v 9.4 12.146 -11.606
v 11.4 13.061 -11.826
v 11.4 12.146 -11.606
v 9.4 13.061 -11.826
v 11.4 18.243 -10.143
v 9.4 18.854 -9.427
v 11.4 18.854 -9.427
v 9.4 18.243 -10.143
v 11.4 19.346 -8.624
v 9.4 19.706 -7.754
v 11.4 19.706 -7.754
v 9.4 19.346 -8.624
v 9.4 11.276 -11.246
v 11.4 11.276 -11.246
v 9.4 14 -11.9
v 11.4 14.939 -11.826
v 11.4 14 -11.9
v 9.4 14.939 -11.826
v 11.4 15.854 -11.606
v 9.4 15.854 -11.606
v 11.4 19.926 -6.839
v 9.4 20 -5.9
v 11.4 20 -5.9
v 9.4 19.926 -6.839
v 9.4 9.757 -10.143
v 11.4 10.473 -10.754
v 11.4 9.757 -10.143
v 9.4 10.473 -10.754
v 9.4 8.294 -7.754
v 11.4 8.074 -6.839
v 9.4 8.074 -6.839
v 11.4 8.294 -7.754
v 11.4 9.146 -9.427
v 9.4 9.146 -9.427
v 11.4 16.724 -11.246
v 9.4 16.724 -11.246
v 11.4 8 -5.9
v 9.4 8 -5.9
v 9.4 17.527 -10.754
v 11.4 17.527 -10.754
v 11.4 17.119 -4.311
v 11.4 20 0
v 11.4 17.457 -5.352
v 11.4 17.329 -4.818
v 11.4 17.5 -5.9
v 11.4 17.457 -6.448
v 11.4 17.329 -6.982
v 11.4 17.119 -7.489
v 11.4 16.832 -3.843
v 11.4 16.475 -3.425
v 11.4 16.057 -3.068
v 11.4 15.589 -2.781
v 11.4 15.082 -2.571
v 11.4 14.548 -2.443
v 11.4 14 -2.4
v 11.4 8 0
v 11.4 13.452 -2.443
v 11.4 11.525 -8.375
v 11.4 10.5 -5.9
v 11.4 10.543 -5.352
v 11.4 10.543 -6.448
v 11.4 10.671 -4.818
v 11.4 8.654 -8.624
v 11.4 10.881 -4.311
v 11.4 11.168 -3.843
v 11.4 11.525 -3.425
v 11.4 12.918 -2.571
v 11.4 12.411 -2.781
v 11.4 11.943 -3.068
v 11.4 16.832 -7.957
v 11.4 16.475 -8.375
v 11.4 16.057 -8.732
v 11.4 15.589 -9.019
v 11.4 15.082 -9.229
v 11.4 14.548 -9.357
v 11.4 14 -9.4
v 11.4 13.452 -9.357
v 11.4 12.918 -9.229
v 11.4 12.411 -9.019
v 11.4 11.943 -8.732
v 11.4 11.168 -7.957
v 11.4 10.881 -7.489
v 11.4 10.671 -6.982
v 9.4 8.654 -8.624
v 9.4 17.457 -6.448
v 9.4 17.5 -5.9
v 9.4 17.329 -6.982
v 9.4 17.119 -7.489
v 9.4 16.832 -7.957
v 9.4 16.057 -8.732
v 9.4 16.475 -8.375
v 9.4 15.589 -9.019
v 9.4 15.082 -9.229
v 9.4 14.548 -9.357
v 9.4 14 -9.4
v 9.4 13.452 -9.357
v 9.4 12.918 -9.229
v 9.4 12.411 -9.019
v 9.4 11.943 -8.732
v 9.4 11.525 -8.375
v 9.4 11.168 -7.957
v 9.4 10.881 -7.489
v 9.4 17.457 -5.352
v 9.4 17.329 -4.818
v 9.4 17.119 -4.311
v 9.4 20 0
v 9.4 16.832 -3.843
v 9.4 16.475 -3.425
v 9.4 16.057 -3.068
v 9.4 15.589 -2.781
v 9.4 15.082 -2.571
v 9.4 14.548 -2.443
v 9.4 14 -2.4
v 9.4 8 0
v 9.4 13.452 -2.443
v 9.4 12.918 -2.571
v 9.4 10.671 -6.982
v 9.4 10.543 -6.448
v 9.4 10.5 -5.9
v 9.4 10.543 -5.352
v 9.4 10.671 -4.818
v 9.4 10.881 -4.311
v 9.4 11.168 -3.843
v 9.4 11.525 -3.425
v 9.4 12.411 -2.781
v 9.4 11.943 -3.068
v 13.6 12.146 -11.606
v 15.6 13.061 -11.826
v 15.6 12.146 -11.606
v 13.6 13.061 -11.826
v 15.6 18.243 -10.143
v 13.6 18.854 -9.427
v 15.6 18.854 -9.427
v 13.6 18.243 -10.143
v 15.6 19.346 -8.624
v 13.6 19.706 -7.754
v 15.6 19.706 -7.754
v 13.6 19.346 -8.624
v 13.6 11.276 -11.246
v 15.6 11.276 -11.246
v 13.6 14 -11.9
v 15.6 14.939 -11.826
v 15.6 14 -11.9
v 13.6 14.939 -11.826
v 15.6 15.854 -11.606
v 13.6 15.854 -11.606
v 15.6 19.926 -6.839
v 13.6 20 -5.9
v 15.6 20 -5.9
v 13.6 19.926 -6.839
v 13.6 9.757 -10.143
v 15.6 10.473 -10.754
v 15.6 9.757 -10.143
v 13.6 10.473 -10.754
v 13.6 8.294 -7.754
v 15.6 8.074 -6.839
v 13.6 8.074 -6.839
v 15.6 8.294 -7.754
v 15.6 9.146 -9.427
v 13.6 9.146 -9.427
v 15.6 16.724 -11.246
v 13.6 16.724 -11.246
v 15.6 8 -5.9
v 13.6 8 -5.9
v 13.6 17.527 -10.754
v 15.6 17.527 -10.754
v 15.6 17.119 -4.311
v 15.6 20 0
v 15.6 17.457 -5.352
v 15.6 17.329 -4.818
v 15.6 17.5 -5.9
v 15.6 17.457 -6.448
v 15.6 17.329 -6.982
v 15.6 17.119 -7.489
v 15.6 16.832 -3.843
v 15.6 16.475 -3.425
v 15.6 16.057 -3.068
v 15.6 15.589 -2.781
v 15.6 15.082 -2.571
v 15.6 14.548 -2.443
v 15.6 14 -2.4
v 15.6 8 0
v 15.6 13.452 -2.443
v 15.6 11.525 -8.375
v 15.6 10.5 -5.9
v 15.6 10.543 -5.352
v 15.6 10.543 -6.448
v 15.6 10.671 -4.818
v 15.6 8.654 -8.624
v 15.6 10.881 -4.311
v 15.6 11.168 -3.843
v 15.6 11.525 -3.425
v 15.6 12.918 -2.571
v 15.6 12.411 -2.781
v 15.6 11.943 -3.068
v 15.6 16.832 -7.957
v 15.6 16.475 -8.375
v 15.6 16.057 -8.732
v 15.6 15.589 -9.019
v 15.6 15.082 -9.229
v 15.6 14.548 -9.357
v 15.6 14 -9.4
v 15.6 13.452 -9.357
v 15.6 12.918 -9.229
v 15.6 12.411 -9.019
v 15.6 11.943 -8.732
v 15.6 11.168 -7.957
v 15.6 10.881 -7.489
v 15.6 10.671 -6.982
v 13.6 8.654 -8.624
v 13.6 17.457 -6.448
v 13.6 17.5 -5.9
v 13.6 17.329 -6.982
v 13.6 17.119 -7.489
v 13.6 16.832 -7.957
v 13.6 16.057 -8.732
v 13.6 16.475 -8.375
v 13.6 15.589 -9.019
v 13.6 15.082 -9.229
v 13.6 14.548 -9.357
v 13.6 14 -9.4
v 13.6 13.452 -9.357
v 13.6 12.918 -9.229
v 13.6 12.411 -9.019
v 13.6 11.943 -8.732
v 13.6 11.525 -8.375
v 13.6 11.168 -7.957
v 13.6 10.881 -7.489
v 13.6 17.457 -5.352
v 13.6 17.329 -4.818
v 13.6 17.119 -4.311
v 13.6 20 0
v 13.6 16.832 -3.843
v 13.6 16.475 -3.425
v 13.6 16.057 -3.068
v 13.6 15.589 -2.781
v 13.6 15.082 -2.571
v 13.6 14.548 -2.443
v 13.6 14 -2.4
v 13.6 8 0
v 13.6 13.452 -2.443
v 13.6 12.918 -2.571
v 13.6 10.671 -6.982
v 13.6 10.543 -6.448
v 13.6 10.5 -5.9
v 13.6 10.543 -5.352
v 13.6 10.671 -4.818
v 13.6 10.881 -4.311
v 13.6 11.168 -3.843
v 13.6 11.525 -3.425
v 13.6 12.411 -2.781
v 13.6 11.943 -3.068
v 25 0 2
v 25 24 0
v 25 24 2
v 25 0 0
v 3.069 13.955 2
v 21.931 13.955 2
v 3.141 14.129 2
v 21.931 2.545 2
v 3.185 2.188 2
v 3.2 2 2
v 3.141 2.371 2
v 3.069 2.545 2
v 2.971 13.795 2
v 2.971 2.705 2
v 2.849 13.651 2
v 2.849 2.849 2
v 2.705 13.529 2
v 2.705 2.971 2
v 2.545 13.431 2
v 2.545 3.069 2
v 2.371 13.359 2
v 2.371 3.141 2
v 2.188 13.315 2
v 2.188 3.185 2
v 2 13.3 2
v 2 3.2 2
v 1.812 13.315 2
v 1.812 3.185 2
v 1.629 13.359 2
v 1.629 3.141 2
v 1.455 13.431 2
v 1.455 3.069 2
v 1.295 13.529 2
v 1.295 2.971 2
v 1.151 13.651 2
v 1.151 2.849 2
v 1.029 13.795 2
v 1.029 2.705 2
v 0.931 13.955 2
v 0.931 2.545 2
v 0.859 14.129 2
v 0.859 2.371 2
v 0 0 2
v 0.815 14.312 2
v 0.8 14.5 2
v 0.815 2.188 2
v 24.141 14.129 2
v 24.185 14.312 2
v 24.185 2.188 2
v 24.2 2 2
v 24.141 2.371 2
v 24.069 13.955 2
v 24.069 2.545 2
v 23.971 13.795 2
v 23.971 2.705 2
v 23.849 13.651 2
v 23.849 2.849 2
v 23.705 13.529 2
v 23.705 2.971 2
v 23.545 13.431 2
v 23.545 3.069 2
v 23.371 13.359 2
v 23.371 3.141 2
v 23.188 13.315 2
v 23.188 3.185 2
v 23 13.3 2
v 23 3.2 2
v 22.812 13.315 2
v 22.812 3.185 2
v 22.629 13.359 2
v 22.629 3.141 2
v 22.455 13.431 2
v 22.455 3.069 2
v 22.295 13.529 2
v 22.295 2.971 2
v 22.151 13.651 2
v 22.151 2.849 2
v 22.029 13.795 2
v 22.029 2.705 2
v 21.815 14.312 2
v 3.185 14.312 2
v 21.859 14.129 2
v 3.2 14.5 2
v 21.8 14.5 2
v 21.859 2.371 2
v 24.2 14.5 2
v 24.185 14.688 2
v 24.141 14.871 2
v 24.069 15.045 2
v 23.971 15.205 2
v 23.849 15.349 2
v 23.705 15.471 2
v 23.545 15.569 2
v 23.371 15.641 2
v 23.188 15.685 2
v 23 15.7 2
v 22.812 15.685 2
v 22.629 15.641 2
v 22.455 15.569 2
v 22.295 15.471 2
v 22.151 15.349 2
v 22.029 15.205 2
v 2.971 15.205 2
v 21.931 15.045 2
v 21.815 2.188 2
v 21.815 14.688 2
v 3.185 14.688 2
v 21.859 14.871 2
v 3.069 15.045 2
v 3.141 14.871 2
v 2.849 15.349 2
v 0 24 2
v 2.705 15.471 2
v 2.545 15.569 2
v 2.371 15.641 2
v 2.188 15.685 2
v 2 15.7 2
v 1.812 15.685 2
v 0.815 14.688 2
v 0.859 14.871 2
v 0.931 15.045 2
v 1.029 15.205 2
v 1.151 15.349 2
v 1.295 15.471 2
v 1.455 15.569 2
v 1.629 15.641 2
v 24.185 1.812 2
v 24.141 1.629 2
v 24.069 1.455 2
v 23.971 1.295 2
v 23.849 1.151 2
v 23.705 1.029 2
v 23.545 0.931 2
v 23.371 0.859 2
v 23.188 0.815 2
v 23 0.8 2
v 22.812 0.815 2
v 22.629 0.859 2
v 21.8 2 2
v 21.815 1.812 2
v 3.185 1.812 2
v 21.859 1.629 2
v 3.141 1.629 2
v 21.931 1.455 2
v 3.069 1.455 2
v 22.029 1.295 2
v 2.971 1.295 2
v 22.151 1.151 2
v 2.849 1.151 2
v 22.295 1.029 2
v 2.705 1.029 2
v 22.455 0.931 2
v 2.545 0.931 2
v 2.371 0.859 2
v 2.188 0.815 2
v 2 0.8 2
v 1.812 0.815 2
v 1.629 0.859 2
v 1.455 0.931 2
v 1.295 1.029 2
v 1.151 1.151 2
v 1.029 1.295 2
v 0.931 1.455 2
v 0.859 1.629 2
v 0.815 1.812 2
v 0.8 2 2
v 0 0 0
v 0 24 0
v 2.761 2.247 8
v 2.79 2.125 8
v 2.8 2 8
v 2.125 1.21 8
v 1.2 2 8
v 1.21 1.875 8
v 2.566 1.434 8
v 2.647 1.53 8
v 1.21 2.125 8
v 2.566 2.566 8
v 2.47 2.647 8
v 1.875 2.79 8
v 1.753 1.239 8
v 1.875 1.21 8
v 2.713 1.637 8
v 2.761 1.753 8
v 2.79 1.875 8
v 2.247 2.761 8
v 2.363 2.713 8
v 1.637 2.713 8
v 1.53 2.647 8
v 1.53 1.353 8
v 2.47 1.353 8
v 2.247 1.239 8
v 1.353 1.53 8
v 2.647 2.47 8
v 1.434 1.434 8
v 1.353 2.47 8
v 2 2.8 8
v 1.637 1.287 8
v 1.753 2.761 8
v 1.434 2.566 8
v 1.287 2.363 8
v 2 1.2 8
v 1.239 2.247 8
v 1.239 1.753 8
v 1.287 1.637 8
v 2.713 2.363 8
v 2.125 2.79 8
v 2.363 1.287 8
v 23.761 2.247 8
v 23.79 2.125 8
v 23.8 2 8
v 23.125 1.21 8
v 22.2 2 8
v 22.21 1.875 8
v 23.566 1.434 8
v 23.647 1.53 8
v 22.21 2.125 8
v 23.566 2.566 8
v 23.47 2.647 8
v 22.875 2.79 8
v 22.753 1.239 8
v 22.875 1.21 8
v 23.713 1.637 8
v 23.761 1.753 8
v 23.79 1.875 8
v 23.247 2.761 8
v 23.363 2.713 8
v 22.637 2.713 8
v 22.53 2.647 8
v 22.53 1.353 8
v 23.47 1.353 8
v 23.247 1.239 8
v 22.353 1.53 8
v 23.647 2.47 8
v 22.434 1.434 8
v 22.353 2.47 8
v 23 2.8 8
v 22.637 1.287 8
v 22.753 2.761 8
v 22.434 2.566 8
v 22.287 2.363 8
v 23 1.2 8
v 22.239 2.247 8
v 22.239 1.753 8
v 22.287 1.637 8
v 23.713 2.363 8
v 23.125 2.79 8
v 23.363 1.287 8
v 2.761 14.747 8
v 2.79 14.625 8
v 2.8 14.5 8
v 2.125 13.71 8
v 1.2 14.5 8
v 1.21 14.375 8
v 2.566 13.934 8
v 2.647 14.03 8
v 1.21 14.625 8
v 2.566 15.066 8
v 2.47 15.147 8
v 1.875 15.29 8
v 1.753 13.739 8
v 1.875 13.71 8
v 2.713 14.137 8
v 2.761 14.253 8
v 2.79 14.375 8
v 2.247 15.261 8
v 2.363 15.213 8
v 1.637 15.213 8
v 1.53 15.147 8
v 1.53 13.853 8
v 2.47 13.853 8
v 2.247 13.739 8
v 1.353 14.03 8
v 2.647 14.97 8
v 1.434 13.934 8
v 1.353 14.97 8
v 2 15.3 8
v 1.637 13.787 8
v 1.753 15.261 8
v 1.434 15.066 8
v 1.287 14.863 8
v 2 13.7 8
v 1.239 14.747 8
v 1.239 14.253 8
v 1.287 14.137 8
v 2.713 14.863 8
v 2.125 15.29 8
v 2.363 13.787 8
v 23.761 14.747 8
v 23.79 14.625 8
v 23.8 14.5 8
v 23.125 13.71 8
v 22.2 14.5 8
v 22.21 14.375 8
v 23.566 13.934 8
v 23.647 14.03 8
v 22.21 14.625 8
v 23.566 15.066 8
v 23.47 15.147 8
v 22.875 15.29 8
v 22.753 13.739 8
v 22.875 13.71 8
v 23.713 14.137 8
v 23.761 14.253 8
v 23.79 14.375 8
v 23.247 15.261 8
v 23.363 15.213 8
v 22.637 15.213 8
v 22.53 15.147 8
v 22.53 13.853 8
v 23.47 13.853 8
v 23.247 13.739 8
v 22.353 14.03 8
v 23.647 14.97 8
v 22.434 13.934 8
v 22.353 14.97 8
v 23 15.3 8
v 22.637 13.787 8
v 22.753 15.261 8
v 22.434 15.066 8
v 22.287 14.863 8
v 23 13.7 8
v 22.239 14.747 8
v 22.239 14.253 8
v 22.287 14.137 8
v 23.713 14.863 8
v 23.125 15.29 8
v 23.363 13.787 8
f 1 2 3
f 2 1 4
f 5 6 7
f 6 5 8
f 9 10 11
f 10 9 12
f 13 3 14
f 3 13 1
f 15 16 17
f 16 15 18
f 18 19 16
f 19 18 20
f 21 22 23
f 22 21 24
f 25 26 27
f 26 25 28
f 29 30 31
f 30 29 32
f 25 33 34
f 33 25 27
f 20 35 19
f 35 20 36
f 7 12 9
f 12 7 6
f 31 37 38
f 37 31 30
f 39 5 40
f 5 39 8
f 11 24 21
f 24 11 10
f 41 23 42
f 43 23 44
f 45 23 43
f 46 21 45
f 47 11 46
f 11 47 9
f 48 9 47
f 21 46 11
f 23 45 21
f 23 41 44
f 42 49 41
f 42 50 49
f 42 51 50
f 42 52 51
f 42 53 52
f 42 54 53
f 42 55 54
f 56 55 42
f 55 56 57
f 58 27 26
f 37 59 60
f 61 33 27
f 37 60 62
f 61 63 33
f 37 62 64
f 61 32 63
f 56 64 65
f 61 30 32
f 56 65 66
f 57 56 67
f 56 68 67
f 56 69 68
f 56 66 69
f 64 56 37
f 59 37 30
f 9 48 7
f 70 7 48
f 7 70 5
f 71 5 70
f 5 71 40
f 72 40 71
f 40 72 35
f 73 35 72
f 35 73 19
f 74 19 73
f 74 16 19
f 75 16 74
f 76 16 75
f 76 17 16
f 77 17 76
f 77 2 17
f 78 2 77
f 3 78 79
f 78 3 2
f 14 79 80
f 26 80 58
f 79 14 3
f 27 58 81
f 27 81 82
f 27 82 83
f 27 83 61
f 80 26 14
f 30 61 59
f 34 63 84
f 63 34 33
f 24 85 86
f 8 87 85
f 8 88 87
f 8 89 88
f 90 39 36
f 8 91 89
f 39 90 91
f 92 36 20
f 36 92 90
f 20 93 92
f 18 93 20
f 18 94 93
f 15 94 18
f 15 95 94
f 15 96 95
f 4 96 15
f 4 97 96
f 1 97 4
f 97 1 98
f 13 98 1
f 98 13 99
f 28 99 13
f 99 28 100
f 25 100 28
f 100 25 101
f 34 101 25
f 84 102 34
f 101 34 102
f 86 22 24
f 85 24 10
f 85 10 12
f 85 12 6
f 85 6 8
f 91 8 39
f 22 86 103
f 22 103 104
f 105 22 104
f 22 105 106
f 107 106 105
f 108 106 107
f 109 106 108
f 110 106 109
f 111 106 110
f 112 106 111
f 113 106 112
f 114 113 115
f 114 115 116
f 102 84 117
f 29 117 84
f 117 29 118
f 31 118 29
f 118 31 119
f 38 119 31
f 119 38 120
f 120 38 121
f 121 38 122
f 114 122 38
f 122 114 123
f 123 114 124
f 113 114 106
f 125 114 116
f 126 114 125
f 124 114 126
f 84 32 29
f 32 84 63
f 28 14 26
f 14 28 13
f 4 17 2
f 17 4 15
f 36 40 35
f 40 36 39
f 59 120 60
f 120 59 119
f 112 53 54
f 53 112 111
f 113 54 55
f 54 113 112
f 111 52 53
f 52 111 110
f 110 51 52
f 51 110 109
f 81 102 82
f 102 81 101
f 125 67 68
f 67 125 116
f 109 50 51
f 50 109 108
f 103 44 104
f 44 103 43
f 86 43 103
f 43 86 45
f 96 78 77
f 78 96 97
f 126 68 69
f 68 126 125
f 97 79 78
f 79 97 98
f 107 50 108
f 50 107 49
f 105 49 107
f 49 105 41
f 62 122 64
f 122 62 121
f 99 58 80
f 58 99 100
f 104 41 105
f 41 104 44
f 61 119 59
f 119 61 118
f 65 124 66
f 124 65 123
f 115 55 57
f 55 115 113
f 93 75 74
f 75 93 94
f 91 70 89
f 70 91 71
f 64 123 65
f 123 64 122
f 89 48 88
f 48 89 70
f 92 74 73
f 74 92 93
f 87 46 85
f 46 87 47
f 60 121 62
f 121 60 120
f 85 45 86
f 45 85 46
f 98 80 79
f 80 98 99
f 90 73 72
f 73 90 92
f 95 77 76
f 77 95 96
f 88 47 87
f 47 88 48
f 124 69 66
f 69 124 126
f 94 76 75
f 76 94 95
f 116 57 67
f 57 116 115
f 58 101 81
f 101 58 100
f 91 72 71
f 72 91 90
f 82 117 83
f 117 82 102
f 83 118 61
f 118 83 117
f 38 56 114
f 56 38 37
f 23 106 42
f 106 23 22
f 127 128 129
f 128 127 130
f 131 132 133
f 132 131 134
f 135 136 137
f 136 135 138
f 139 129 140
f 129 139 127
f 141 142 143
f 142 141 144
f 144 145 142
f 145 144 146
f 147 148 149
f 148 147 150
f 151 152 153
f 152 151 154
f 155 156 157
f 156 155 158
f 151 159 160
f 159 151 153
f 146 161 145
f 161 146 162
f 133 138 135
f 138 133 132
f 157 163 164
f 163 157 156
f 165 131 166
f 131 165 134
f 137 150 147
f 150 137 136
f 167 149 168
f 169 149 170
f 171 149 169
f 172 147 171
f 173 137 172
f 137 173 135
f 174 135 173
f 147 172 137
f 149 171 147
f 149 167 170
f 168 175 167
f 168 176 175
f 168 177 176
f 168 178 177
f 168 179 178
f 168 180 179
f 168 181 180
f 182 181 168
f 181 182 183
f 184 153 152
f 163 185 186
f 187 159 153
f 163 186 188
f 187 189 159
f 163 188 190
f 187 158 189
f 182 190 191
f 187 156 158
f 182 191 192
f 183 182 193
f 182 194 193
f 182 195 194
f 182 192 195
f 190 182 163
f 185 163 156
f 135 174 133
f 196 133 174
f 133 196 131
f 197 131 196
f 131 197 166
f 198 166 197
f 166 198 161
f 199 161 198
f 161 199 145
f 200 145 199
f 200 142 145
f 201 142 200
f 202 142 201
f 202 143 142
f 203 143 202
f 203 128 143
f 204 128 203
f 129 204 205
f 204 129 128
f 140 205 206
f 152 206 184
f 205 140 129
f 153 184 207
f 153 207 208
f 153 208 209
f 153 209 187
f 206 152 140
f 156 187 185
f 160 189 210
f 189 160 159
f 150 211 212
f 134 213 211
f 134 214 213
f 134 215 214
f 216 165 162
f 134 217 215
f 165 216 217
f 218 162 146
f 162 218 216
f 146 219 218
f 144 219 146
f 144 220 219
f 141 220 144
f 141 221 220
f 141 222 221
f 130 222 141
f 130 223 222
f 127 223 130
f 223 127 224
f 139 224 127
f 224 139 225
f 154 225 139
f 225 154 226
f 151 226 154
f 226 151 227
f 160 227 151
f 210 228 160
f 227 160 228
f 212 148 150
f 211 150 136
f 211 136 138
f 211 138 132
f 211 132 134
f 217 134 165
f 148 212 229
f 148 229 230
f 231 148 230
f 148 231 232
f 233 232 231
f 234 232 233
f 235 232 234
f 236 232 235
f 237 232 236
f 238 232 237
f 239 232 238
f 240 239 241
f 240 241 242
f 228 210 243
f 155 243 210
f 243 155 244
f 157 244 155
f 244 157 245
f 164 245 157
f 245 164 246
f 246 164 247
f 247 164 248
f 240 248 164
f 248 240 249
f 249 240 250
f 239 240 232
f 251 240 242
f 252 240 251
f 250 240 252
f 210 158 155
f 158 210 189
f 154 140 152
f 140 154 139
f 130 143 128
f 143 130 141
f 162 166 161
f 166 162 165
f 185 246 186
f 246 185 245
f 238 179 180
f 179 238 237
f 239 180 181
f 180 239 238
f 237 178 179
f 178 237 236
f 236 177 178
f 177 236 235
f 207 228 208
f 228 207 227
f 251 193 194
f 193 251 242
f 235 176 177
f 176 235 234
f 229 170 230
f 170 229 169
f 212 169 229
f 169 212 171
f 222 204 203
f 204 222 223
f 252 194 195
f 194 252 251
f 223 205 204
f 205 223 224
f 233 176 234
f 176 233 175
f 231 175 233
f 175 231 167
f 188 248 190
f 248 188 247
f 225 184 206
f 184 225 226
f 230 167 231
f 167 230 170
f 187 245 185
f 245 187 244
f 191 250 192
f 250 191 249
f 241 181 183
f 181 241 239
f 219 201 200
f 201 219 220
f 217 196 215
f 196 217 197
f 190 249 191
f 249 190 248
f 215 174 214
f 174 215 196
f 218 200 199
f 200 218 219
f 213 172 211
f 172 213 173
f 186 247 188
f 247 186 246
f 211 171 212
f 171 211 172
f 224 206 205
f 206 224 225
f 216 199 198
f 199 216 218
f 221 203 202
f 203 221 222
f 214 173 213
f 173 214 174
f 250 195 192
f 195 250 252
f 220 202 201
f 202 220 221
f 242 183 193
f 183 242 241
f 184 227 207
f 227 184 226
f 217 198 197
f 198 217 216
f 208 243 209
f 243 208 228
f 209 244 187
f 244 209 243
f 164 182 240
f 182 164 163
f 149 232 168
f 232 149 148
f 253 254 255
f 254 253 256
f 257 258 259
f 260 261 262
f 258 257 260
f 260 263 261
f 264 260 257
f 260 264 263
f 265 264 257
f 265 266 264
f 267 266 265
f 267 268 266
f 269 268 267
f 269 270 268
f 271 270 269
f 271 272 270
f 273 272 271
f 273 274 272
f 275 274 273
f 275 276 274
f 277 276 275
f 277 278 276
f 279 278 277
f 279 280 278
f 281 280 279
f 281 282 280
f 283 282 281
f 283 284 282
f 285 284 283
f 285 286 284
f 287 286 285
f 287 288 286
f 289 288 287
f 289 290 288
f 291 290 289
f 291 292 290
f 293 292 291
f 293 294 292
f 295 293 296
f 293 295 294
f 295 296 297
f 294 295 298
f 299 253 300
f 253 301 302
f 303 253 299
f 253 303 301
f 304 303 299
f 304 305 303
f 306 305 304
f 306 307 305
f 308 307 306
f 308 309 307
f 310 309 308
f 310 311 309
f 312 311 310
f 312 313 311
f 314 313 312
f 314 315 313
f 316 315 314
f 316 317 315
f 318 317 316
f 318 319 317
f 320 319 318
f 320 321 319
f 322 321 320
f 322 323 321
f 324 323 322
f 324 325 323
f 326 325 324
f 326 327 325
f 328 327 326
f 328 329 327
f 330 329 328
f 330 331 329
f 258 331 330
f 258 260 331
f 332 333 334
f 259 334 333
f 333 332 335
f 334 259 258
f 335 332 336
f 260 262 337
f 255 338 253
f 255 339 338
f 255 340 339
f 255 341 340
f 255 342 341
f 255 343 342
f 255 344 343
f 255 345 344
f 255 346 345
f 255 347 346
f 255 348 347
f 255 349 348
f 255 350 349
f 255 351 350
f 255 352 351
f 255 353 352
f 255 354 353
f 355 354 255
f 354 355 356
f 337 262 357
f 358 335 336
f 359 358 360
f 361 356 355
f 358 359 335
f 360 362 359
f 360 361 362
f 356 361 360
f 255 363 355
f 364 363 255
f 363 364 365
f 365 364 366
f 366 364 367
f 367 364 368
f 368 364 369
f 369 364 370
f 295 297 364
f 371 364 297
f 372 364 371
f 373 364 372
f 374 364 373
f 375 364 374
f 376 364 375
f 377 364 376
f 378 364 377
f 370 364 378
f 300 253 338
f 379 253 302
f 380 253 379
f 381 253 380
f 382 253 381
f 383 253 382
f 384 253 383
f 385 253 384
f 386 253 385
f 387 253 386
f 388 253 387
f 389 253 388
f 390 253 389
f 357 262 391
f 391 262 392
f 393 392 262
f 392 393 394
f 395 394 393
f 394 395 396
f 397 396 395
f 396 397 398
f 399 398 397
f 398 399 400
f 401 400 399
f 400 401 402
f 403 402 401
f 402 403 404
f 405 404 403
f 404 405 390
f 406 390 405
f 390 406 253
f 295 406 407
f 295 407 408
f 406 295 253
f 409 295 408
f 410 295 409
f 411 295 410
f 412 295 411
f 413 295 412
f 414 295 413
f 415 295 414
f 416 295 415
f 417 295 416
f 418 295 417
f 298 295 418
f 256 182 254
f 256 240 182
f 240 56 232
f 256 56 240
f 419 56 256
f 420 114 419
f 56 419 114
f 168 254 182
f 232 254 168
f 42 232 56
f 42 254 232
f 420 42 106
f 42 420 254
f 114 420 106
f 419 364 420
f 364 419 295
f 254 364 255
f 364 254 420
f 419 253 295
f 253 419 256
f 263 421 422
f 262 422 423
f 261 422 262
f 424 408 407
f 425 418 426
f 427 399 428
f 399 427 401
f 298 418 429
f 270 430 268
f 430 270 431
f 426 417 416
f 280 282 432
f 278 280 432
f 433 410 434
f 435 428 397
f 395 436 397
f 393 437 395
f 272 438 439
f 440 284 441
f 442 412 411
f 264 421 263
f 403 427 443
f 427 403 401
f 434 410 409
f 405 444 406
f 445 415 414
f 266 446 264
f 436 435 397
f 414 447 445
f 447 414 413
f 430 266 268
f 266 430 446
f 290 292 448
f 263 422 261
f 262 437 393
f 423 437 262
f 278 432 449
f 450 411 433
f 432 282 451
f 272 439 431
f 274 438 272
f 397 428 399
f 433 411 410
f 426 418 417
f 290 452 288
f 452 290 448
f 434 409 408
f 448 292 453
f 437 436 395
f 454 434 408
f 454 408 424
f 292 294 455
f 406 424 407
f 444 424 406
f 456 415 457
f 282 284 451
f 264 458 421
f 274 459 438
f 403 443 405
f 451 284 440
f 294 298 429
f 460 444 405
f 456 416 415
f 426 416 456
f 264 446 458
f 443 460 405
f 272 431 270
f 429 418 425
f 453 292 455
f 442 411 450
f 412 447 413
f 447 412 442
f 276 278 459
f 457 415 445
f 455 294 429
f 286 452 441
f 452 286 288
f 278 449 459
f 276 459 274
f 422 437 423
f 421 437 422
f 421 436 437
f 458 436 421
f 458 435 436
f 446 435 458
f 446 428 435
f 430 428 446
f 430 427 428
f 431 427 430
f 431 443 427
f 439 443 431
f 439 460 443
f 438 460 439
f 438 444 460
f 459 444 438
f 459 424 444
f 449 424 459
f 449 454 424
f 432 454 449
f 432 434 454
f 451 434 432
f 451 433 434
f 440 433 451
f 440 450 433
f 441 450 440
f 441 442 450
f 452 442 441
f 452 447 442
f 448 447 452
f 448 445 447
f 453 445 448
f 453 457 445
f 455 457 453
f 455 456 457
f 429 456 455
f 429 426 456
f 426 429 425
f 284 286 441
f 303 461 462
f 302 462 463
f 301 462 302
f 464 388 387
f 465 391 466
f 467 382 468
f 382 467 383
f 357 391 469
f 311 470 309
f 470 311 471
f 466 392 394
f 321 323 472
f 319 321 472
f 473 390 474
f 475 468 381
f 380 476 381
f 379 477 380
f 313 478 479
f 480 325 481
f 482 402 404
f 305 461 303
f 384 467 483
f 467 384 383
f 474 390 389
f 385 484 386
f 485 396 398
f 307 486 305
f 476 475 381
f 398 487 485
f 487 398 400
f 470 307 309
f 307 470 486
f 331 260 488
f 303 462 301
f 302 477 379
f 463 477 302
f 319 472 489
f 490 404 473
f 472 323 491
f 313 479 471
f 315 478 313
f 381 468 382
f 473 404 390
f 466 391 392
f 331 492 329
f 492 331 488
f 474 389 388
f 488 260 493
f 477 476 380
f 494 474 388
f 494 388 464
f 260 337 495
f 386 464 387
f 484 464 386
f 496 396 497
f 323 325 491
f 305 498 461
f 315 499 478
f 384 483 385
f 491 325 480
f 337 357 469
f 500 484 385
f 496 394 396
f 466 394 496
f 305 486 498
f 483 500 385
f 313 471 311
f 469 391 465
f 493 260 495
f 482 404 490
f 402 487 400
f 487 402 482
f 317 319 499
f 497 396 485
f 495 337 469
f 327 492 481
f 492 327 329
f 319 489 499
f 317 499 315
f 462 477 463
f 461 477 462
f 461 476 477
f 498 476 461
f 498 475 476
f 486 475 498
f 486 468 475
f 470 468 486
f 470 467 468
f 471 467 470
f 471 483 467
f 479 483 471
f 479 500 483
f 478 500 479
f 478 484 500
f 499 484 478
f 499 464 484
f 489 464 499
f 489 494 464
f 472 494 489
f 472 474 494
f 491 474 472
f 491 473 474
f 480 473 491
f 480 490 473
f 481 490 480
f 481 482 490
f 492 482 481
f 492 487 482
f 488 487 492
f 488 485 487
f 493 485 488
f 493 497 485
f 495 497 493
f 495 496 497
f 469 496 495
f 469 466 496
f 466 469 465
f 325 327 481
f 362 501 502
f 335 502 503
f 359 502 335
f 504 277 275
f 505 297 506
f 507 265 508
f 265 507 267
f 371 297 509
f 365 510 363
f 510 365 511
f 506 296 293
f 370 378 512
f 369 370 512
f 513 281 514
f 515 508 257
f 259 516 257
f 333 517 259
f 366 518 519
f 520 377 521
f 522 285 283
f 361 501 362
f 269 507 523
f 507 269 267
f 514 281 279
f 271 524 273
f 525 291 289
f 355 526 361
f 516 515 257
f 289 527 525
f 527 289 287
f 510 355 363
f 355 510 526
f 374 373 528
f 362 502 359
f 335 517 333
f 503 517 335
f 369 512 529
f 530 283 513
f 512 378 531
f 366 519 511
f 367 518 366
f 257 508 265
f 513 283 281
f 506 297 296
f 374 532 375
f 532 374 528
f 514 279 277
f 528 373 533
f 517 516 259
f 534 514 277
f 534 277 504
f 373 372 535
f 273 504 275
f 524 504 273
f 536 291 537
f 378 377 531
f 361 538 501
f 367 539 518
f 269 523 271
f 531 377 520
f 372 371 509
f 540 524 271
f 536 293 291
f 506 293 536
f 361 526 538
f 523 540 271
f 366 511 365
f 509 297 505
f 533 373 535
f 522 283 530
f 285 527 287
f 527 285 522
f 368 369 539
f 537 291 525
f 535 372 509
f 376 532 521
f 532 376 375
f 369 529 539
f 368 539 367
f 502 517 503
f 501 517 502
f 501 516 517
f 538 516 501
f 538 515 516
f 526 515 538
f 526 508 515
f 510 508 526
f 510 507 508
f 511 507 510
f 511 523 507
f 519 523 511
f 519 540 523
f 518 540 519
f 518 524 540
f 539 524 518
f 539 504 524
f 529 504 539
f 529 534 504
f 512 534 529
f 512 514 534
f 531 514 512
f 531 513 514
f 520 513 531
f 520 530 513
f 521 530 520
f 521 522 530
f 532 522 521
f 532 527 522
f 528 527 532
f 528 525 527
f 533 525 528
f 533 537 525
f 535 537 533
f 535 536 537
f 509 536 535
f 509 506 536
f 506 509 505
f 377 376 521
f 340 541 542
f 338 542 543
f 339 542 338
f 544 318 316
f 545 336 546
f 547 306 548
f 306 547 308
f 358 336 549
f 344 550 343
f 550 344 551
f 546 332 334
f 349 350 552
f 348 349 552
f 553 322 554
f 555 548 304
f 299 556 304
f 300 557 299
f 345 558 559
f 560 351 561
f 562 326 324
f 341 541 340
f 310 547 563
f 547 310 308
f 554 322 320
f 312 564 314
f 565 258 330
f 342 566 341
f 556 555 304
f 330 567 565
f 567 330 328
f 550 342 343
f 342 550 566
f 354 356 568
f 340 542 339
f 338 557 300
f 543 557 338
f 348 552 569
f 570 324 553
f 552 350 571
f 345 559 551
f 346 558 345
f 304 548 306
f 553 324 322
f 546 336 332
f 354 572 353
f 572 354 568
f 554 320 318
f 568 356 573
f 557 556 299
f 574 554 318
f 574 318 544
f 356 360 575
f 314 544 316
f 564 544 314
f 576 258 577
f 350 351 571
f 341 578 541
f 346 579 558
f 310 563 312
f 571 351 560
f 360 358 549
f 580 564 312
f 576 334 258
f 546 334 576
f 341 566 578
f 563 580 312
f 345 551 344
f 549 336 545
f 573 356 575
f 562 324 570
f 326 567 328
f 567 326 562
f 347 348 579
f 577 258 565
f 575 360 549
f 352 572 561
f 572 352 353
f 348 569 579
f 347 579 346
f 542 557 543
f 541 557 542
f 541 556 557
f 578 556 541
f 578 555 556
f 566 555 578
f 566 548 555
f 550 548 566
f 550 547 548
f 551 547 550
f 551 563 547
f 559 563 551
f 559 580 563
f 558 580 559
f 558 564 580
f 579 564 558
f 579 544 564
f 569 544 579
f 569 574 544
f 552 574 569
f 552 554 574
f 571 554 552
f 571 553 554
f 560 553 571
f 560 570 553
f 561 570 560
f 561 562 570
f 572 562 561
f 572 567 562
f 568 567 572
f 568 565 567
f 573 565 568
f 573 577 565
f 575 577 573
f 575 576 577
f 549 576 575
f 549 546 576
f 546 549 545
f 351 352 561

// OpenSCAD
// RPi Camera v2 mount (version 2, with pins)
//
$fn = 40;
cube([25,24,2]);
translate([2,2,2]){cylinder(h=6,d1=2.4,d2=1.6);}
translate([23,2,2]){cylinder(h=6,d1=2.4,d2=1.6);}
translate([2,14.5,2]){cylinder(h=6,d1=2.4,d2=1.6);}
translate([23,14.5,2]){cylinder(h=6,d1=2.4,d2=1.6);}
module pin_arm(){
    translate([0,-6,0]){
        cube([6,2,2]);
    }
    translate([0,4,0]){
        cube([6,2,2]);
    }
    translate([4,-6,0]){
        cube([2,10,2]);
    }
    difference(){
        translate([0,0,0]){
            rotate([0,0,0]){
                cylinder(h=2,d=12);
            }
        }
        translate([0,0,-0.5]){
            rotate([0,0,0]){
                cylinder(h=3,d=7);
            }
        }
    }   
}
// two pin arms for mounting go-pro style
// 12.5 for midpoint, neg space, 2 on each side.
// added 0.1 on each so middle is 2.2 mm not 2mm
translate([11.4,14,-5.9]){
    rotate([0,-90,0]){
        pin_arm();
    }
}
translate([15.6,14,-5.9]){
    rotate([0,-90,0]){
        pin_arm();
    }
}
